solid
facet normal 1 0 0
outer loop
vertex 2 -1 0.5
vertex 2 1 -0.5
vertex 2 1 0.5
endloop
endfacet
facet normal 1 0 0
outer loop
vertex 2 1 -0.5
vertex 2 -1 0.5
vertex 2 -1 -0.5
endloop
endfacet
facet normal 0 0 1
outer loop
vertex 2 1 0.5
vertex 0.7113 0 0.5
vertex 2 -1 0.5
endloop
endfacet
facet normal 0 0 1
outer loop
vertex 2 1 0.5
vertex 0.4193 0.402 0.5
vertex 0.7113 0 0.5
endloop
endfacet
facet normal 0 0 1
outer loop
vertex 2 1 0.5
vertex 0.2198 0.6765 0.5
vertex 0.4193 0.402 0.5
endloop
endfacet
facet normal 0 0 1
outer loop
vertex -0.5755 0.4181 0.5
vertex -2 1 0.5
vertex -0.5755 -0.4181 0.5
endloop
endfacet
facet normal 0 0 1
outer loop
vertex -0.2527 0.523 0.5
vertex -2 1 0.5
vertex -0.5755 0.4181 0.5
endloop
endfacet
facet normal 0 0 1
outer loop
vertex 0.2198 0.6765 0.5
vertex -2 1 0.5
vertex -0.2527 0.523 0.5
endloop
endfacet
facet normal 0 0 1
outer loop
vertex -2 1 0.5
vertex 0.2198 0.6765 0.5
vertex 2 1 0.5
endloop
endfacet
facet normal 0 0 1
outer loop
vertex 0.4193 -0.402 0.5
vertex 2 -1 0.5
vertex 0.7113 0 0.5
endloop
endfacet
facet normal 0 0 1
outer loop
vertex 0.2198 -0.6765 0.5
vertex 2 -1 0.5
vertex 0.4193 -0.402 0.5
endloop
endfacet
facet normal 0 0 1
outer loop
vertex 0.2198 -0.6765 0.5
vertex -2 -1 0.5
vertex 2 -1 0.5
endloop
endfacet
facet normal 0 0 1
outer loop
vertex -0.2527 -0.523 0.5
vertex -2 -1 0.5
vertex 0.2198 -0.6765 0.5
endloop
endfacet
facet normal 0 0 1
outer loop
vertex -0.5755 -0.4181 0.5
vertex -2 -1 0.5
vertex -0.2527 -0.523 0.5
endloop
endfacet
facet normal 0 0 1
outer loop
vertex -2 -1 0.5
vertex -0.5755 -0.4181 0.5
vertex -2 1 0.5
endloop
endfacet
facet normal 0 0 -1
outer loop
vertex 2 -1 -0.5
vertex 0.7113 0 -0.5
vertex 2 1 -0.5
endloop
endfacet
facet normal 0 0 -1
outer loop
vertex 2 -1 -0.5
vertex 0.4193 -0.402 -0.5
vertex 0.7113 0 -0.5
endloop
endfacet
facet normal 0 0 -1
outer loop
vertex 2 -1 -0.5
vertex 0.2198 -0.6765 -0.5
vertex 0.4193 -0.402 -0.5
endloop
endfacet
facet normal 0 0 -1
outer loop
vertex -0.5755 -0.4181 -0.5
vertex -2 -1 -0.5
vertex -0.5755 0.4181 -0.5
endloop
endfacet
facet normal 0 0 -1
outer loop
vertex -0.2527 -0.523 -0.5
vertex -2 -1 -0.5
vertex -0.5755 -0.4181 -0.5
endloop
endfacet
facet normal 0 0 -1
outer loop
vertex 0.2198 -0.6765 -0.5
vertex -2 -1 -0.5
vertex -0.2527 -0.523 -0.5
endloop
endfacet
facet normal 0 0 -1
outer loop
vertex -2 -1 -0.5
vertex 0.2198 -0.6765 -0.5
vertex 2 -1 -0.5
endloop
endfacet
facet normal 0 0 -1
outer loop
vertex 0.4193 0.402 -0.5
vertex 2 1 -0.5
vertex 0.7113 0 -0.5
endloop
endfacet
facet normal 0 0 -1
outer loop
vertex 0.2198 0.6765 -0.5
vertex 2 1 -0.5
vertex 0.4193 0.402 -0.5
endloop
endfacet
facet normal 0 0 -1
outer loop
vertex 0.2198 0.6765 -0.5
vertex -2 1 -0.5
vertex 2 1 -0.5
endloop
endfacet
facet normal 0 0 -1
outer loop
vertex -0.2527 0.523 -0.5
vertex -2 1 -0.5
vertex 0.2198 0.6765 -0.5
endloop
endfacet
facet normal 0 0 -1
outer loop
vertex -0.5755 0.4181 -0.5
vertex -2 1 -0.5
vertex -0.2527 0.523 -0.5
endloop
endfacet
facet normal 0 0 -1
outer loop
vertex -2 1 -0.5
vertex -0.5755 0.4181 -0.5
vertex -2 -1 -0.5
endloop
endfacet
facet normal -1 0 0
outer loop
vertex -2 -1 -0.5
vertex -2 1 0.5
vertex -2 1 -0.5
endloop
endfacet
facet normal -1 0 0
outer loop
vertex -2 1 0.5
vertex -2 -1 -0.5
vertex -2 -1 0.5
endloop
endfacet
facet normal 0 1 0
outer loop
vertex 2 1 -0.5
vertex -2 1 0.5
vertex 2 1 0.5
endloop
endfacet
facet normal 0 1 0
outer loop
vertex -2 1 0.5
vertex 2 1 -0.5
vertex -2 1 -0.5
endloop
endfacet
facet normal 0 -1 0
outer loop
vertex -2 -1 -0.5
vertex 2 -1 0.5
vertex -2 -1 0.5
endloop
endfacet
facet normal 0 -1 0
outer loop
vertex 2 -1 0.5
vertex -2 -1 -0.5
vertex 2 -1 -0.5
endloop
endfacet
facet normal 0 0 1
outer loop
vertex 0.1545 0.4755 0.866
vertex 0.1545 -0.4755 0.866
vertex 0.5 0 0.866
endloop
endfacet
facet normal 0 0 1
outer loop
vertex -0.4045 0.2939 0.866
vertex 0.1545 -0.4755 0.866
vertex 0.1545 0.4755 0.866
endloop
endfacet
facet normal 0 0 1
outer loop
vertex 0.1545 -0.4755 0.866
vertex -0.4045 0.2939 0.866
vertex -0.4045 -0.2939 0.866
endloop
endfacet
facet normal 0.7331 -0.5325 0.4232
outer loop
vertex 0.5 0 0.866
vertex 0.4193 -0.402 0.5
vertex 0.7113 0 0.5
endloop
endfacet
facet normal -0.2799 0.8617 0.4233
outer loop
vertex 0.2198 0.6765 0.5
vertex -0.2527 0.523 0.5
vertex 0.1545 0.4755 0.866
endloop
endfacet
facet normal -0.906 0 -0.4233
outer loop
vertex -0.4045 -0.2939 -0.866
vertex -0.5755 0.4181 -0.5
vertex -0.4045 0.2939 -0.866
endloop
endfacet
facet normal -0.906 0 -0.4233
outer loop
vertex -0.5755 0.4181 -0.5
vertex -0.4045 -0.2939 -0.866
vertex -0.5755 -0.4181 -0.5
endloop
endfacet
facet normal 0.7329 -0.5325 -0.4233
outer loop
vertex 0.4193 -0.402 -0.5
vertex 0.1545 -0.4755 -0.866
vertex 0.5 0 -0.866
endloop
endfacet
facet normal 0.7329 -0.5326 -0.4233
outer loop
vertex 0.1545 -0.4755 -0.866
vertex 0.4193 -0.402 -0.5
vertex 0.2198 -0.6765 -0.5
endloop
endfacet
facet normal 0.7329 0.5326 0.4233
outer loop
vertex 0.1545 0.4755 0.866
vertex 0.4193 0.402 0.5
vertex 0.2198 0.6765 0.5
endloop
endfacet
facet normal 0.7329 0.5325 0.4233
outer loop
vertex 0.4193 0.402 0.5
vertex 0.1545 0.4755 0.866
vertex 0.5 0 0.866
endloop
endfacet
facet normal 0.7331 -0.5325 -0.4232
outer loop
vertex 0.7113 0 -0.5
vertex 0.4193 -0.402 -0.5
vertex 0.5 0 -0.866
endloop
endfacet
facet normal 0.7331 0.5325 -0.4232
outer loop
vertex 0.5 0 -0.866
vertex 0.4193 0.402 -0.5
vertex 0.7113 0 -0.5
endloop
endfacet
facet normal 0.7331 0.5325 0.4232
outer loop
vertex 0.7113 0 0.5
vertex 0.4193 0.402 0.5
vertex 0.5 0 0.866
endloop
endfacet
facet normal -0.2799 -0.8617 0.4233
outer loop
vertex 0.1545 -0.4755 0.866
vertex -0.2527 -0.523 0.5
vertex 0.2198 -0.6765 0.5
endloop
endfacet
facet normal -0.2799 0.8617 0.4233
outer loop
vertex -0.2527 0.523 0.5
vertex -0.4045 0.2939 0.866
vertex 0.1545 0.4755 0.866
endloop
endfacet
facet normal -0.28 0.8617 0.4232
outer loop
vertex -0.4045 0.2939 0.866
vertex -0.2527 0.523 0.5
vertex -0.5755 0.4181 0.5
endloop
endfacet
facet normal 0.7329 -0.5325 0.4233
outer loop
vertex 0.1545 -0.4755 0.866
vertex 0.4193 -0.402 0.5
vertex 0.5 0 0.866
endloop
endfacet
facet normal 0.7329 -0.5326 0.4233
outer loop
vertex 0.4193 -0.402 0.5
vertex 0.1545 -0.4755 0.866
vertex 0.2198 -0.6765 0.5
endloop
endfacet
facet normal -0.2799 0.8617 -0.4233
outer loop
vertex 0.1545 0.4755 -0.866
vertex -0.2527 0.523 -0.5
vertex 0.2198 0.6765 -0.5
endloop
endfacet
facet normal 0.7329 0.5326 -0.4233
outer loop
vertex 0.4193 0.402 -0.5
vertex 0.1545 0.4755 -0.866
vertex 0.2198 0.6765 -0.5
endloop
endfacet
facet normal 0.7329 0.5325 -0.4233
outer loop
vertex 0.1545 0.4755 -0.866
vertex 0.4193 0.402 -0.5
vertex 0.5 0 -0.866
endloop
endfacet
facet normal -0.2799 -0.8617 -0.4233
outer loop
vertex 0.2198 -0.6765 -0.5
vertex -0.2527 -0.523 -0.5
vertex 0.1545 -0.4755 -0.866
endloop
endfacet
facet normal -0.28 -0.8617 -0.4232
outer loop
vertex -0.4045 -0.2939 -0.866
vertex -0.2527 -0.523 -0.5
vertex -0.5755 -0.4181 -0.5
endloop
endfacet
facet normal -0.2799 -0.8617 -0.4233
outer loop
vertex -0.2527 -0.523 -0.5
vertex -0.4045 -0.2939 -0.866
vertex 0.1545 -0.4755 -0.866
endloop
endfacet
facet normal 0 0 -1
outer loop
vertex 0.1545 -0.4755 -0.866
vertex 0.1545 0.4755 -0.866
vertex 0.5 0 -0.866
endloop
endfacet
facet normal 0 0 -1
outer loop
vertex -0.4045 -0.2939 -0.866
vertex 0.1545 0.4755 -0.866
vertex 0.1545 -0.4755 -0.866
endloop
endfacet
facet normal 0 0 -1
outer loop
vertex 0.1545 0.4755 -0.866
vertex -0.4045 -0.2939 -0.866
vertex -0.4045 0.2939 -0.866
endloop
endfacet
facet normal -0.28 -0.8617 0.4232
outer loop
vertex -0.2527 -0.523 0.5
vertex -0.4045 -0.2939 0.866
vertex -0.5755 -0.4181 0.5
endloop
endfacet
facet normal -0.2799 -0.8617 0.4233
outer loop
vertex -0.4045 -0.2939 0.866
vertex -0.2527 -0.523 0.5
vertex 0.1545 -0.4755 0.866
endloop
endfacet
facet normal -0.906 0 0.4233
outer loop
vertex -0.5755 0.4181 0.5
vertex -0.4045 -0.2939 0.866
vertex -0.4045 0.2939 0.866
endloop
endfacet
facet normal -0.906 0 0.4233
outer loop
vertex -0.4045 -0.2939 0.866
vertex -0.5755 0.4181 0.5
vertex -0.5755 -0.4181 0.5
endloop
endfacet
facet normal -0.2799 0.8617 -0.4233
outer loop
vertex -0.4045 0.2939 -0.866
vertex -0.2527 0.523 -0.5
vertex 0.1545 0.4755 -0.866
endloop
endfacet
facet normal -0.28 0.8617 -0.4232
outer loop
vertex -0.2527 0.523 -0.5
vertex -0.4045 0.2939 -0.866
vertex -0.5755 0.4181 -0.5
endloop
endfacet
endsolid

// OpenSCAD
union() {
    cube(size=[4.0, 2.0, 1.0], center=true);
    sphere(r=1.0);
};
